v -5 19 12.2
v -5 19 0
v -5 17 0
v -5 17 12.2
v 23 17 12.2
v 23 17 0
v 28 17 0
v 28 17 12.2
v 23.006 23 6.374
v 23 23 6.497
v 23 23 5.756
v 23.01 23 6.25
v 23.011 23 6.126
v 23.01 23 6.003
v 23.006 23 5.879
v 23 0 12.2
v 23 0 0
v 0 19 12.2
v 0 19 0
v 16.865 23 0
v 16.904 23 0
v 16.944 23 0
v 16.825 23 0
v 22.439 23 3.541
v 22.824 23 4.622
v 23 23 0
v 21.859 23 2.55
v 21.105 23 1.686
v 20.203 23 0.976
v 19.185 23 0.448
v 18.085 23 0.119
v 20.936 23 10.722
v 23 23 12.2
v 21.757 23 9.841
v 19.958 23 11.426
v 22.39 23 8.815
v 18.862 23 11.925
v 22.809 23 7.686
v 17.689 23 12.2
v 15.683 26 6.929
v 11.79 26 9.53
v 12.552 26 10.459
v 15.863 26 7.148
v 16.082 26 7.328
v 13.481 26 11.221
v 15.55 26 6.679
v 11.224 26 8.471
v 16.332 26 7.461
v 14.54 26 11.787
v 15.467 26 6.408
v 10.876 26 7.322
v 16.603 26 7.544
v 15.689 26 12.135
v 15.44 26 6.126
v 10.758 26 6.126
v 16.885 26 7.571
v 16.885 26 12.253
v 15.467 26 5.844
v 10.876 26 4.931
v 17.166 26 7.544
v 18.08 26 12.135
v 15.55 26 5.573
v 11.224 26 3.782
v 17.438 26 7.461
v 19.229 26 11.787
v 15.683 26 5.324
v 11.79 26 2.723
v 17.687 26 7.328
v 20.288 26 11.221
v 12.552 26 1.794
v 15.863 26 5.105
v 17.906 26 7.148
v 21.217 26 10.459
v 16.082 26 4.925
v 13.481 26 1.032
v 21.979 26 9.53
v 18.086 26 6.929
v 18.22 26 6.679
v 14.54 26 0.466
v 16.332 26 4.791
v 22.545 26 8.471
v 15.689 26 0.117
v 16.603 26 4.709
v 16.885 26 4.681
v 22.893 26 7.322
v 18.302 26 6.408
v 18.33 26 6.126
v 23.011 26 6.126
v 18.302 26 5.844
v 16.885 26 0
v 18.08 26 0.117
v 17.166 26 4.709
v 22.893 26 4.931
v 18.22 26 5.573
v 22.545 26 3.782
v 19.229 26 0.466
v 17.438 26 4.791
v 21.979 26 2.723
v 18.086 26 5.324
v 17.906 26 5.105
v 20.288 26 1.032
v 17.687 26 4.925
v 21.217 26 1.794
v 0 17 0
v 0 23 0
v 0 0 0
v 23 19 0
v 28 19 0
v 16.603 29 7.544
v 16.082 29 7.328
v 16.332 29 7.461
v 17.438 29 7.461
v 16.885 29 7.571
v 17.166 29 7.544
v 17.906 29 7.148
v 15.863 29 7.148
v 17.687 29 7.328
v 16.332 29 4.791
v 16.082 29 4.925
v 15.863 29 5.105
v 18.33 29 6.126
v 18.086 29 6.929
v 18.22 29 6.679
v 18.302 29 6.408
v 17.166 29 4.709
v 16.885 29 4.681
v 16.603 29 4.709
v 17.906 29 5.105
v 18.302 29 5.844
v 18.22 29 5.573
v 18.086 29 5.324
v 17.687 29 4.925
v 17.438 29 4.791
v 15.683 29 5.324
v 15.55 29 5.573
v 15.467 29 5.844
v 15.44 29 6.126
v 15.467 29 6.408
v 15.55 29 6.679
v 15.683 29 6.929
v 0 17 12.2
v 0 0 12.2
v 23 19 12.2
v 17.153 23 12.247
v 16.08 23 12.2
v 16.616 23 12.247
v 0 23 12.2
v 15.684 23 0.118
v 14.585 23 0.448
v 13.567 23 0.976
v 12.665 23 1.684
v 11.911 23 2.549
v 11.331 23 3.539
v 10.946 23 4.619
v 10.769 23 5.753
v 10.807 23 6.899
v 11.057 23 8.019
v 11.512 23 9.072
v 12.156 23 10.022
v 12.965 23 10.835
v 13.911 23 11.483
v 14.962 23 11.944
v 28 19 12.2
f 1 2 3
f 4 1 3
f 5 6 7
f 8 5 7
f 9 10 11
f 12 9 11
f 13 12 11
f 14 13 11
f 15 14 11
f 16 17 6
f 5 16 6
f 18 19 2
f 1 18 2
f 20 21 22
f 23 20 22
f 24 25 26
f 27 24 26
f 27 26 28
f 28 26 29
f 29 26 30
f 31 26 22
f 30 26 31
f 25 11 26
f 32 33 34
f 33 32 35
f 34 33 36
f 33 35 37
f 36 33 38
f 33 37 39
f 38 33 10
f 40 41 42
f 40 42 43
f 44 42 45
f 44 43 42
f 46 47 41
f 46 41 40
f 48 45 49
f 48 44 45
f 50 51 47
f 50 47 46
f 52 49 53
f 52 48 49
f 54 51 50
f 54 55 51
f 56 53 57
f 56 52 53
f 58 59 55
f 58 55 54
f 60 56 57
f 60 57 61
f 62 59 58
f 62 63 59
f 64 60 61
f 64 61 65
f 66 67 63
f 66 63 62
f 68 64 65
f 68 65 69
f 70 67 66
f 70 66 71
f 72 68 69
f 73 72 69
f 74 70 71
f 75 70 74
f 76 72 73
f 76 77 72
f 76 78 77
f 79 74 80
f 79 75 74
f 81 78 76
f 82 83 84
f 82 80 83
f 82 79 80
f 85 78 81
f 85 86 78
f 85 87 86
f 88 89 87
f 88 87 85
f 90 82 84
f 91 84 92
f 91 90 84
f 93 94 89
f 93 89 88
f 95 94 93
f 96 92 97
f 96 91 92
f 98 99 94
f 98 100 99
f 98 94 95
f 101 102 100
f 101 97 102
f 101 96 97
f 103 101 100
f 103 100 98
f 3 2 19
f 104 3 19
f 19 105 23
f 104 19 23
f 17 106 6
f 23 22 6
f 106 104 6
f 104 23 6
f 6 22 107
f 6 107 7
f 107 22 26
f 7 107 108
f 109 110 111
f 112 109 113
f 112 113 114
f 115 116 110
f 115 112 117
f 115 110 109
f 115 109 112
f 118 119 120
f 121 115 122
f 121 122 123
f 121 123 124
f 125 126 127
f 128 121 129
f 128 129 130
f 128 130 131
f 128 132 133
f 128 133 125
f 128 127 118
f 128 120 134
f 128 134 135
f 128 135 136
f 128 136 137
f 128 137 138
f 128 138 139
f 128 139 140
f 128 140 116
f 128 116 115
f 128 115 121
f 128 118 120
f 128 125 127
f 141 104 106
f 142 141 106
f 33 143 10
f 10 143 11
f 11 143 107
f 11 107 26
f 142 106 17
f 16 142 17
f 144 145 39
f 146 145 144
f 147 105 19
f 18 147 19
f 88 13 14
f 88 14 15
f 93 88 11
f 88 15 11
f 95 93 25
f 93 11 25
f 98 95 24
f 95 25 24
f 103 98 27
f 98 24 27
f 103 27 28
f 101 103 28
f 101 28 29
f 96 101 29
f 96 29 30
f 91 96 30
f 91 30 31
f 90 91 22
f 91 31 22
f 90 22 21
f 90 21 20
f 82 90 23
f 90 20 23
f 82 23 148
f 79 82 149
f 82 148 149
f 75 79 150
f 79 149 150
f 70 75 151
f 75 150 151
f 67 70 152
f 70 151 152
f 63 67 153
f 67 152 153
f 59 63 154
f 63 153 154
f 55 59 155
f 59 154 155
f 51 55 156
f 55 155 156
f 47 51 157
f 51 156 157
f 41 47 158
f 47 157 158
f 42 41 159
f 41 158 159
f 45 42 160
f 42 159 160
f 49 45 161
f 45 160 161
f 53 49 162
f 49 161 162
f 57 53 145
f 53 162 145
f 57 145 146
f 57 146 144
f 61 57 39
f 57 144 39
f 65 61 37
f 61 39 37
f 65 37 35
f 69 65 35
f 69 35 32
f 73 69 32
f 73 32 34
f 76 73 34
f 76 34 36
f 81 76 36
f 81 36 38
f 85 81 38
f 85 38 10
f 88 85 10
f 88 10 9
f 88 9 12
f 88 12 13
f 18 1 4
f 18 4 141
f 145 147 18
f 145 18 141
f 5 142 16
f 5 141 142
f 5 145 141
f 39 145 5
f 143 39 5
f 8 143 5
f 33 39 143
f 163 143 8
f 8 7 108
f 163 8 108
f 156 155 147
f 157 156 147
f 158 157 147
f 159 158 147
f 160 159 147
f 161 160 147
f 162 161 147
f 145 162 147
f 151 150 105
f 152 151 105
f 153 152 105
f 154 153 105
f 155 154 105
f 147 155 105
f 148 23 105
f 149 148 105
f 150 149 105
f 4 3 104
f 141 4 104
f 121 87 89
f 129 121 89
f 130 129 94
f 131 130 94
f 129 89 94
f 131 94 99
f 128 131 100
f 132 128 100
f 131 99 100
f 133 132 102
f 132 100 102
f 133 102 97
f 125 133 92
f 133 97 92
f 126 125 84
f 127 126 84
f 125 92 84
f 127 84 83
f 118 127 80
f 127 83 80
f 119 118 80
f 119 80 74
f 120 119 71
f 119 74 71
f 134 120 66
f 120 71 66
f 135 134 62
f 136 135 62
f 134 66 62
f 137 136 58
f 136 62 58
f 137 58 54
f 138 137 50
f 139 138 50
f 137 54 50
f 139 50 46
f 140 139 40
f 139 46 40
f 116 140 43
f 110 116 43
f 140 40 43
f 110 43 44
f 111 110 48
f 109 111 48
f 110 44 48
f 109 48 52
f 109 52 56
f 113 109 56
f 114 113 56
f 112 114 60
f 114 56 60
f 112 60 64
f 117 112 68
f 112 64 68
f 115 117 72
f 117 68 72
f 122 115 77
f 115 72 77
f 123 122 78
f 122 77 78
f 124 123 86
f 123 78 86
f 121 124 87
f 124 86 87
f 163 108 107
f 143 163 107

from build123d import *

# Parameters (mm, degrees)
BOSS_EXTRUDE1_DEPTH = 12.2
SKETCH2_R           = 6.126682997
BOSS_EXTRUDE2_DEPTH = 3
SKETCH3_R           = 1.445
BOSS_EXTRUDE3_DEPTH = 3


with BuildPart() as part:
    # Sketch1 → Boss-Extrude1 (new body)
    with BuildSketch(Plane.XY):
        Polygon((0, 0), (23, 0), (23, 17), (28, 17), (28, 19), (23, 19), (23, 23), (0, 23), (0, 19), (-5, 19), (-5, 17), (0, 17), align=None)
    extrude(amount=BOSS_EXTRUDE1_DEPTH)

    # Sketch2 → Boss-Extrude2 (add)
    with BuildSketch(Plane(origin=(0, 23, 0), x_dir=(1, 0, 0), z_dir=(0, 1, 0))):
        with Locations((16.884532498, -6.126394767)):
            Circle(SKETCH2_R)
    extrude(amount=BOSS_EXTRUDE2_DEPTH)

    # Sketch3 → Boss-Extrude3 (add)
    with BuildSketch(Plane(origin=(0, 26, 0), x_dir=(1, 0, 0), z_dir=(0, 1, 0))):
        with Locations((16.884532498, -6.126394767)):
            Circle(SKETCH3_R)
    extrude(amount=BOSS_EXTRUDE3_DEPTH)


solid = part.part
